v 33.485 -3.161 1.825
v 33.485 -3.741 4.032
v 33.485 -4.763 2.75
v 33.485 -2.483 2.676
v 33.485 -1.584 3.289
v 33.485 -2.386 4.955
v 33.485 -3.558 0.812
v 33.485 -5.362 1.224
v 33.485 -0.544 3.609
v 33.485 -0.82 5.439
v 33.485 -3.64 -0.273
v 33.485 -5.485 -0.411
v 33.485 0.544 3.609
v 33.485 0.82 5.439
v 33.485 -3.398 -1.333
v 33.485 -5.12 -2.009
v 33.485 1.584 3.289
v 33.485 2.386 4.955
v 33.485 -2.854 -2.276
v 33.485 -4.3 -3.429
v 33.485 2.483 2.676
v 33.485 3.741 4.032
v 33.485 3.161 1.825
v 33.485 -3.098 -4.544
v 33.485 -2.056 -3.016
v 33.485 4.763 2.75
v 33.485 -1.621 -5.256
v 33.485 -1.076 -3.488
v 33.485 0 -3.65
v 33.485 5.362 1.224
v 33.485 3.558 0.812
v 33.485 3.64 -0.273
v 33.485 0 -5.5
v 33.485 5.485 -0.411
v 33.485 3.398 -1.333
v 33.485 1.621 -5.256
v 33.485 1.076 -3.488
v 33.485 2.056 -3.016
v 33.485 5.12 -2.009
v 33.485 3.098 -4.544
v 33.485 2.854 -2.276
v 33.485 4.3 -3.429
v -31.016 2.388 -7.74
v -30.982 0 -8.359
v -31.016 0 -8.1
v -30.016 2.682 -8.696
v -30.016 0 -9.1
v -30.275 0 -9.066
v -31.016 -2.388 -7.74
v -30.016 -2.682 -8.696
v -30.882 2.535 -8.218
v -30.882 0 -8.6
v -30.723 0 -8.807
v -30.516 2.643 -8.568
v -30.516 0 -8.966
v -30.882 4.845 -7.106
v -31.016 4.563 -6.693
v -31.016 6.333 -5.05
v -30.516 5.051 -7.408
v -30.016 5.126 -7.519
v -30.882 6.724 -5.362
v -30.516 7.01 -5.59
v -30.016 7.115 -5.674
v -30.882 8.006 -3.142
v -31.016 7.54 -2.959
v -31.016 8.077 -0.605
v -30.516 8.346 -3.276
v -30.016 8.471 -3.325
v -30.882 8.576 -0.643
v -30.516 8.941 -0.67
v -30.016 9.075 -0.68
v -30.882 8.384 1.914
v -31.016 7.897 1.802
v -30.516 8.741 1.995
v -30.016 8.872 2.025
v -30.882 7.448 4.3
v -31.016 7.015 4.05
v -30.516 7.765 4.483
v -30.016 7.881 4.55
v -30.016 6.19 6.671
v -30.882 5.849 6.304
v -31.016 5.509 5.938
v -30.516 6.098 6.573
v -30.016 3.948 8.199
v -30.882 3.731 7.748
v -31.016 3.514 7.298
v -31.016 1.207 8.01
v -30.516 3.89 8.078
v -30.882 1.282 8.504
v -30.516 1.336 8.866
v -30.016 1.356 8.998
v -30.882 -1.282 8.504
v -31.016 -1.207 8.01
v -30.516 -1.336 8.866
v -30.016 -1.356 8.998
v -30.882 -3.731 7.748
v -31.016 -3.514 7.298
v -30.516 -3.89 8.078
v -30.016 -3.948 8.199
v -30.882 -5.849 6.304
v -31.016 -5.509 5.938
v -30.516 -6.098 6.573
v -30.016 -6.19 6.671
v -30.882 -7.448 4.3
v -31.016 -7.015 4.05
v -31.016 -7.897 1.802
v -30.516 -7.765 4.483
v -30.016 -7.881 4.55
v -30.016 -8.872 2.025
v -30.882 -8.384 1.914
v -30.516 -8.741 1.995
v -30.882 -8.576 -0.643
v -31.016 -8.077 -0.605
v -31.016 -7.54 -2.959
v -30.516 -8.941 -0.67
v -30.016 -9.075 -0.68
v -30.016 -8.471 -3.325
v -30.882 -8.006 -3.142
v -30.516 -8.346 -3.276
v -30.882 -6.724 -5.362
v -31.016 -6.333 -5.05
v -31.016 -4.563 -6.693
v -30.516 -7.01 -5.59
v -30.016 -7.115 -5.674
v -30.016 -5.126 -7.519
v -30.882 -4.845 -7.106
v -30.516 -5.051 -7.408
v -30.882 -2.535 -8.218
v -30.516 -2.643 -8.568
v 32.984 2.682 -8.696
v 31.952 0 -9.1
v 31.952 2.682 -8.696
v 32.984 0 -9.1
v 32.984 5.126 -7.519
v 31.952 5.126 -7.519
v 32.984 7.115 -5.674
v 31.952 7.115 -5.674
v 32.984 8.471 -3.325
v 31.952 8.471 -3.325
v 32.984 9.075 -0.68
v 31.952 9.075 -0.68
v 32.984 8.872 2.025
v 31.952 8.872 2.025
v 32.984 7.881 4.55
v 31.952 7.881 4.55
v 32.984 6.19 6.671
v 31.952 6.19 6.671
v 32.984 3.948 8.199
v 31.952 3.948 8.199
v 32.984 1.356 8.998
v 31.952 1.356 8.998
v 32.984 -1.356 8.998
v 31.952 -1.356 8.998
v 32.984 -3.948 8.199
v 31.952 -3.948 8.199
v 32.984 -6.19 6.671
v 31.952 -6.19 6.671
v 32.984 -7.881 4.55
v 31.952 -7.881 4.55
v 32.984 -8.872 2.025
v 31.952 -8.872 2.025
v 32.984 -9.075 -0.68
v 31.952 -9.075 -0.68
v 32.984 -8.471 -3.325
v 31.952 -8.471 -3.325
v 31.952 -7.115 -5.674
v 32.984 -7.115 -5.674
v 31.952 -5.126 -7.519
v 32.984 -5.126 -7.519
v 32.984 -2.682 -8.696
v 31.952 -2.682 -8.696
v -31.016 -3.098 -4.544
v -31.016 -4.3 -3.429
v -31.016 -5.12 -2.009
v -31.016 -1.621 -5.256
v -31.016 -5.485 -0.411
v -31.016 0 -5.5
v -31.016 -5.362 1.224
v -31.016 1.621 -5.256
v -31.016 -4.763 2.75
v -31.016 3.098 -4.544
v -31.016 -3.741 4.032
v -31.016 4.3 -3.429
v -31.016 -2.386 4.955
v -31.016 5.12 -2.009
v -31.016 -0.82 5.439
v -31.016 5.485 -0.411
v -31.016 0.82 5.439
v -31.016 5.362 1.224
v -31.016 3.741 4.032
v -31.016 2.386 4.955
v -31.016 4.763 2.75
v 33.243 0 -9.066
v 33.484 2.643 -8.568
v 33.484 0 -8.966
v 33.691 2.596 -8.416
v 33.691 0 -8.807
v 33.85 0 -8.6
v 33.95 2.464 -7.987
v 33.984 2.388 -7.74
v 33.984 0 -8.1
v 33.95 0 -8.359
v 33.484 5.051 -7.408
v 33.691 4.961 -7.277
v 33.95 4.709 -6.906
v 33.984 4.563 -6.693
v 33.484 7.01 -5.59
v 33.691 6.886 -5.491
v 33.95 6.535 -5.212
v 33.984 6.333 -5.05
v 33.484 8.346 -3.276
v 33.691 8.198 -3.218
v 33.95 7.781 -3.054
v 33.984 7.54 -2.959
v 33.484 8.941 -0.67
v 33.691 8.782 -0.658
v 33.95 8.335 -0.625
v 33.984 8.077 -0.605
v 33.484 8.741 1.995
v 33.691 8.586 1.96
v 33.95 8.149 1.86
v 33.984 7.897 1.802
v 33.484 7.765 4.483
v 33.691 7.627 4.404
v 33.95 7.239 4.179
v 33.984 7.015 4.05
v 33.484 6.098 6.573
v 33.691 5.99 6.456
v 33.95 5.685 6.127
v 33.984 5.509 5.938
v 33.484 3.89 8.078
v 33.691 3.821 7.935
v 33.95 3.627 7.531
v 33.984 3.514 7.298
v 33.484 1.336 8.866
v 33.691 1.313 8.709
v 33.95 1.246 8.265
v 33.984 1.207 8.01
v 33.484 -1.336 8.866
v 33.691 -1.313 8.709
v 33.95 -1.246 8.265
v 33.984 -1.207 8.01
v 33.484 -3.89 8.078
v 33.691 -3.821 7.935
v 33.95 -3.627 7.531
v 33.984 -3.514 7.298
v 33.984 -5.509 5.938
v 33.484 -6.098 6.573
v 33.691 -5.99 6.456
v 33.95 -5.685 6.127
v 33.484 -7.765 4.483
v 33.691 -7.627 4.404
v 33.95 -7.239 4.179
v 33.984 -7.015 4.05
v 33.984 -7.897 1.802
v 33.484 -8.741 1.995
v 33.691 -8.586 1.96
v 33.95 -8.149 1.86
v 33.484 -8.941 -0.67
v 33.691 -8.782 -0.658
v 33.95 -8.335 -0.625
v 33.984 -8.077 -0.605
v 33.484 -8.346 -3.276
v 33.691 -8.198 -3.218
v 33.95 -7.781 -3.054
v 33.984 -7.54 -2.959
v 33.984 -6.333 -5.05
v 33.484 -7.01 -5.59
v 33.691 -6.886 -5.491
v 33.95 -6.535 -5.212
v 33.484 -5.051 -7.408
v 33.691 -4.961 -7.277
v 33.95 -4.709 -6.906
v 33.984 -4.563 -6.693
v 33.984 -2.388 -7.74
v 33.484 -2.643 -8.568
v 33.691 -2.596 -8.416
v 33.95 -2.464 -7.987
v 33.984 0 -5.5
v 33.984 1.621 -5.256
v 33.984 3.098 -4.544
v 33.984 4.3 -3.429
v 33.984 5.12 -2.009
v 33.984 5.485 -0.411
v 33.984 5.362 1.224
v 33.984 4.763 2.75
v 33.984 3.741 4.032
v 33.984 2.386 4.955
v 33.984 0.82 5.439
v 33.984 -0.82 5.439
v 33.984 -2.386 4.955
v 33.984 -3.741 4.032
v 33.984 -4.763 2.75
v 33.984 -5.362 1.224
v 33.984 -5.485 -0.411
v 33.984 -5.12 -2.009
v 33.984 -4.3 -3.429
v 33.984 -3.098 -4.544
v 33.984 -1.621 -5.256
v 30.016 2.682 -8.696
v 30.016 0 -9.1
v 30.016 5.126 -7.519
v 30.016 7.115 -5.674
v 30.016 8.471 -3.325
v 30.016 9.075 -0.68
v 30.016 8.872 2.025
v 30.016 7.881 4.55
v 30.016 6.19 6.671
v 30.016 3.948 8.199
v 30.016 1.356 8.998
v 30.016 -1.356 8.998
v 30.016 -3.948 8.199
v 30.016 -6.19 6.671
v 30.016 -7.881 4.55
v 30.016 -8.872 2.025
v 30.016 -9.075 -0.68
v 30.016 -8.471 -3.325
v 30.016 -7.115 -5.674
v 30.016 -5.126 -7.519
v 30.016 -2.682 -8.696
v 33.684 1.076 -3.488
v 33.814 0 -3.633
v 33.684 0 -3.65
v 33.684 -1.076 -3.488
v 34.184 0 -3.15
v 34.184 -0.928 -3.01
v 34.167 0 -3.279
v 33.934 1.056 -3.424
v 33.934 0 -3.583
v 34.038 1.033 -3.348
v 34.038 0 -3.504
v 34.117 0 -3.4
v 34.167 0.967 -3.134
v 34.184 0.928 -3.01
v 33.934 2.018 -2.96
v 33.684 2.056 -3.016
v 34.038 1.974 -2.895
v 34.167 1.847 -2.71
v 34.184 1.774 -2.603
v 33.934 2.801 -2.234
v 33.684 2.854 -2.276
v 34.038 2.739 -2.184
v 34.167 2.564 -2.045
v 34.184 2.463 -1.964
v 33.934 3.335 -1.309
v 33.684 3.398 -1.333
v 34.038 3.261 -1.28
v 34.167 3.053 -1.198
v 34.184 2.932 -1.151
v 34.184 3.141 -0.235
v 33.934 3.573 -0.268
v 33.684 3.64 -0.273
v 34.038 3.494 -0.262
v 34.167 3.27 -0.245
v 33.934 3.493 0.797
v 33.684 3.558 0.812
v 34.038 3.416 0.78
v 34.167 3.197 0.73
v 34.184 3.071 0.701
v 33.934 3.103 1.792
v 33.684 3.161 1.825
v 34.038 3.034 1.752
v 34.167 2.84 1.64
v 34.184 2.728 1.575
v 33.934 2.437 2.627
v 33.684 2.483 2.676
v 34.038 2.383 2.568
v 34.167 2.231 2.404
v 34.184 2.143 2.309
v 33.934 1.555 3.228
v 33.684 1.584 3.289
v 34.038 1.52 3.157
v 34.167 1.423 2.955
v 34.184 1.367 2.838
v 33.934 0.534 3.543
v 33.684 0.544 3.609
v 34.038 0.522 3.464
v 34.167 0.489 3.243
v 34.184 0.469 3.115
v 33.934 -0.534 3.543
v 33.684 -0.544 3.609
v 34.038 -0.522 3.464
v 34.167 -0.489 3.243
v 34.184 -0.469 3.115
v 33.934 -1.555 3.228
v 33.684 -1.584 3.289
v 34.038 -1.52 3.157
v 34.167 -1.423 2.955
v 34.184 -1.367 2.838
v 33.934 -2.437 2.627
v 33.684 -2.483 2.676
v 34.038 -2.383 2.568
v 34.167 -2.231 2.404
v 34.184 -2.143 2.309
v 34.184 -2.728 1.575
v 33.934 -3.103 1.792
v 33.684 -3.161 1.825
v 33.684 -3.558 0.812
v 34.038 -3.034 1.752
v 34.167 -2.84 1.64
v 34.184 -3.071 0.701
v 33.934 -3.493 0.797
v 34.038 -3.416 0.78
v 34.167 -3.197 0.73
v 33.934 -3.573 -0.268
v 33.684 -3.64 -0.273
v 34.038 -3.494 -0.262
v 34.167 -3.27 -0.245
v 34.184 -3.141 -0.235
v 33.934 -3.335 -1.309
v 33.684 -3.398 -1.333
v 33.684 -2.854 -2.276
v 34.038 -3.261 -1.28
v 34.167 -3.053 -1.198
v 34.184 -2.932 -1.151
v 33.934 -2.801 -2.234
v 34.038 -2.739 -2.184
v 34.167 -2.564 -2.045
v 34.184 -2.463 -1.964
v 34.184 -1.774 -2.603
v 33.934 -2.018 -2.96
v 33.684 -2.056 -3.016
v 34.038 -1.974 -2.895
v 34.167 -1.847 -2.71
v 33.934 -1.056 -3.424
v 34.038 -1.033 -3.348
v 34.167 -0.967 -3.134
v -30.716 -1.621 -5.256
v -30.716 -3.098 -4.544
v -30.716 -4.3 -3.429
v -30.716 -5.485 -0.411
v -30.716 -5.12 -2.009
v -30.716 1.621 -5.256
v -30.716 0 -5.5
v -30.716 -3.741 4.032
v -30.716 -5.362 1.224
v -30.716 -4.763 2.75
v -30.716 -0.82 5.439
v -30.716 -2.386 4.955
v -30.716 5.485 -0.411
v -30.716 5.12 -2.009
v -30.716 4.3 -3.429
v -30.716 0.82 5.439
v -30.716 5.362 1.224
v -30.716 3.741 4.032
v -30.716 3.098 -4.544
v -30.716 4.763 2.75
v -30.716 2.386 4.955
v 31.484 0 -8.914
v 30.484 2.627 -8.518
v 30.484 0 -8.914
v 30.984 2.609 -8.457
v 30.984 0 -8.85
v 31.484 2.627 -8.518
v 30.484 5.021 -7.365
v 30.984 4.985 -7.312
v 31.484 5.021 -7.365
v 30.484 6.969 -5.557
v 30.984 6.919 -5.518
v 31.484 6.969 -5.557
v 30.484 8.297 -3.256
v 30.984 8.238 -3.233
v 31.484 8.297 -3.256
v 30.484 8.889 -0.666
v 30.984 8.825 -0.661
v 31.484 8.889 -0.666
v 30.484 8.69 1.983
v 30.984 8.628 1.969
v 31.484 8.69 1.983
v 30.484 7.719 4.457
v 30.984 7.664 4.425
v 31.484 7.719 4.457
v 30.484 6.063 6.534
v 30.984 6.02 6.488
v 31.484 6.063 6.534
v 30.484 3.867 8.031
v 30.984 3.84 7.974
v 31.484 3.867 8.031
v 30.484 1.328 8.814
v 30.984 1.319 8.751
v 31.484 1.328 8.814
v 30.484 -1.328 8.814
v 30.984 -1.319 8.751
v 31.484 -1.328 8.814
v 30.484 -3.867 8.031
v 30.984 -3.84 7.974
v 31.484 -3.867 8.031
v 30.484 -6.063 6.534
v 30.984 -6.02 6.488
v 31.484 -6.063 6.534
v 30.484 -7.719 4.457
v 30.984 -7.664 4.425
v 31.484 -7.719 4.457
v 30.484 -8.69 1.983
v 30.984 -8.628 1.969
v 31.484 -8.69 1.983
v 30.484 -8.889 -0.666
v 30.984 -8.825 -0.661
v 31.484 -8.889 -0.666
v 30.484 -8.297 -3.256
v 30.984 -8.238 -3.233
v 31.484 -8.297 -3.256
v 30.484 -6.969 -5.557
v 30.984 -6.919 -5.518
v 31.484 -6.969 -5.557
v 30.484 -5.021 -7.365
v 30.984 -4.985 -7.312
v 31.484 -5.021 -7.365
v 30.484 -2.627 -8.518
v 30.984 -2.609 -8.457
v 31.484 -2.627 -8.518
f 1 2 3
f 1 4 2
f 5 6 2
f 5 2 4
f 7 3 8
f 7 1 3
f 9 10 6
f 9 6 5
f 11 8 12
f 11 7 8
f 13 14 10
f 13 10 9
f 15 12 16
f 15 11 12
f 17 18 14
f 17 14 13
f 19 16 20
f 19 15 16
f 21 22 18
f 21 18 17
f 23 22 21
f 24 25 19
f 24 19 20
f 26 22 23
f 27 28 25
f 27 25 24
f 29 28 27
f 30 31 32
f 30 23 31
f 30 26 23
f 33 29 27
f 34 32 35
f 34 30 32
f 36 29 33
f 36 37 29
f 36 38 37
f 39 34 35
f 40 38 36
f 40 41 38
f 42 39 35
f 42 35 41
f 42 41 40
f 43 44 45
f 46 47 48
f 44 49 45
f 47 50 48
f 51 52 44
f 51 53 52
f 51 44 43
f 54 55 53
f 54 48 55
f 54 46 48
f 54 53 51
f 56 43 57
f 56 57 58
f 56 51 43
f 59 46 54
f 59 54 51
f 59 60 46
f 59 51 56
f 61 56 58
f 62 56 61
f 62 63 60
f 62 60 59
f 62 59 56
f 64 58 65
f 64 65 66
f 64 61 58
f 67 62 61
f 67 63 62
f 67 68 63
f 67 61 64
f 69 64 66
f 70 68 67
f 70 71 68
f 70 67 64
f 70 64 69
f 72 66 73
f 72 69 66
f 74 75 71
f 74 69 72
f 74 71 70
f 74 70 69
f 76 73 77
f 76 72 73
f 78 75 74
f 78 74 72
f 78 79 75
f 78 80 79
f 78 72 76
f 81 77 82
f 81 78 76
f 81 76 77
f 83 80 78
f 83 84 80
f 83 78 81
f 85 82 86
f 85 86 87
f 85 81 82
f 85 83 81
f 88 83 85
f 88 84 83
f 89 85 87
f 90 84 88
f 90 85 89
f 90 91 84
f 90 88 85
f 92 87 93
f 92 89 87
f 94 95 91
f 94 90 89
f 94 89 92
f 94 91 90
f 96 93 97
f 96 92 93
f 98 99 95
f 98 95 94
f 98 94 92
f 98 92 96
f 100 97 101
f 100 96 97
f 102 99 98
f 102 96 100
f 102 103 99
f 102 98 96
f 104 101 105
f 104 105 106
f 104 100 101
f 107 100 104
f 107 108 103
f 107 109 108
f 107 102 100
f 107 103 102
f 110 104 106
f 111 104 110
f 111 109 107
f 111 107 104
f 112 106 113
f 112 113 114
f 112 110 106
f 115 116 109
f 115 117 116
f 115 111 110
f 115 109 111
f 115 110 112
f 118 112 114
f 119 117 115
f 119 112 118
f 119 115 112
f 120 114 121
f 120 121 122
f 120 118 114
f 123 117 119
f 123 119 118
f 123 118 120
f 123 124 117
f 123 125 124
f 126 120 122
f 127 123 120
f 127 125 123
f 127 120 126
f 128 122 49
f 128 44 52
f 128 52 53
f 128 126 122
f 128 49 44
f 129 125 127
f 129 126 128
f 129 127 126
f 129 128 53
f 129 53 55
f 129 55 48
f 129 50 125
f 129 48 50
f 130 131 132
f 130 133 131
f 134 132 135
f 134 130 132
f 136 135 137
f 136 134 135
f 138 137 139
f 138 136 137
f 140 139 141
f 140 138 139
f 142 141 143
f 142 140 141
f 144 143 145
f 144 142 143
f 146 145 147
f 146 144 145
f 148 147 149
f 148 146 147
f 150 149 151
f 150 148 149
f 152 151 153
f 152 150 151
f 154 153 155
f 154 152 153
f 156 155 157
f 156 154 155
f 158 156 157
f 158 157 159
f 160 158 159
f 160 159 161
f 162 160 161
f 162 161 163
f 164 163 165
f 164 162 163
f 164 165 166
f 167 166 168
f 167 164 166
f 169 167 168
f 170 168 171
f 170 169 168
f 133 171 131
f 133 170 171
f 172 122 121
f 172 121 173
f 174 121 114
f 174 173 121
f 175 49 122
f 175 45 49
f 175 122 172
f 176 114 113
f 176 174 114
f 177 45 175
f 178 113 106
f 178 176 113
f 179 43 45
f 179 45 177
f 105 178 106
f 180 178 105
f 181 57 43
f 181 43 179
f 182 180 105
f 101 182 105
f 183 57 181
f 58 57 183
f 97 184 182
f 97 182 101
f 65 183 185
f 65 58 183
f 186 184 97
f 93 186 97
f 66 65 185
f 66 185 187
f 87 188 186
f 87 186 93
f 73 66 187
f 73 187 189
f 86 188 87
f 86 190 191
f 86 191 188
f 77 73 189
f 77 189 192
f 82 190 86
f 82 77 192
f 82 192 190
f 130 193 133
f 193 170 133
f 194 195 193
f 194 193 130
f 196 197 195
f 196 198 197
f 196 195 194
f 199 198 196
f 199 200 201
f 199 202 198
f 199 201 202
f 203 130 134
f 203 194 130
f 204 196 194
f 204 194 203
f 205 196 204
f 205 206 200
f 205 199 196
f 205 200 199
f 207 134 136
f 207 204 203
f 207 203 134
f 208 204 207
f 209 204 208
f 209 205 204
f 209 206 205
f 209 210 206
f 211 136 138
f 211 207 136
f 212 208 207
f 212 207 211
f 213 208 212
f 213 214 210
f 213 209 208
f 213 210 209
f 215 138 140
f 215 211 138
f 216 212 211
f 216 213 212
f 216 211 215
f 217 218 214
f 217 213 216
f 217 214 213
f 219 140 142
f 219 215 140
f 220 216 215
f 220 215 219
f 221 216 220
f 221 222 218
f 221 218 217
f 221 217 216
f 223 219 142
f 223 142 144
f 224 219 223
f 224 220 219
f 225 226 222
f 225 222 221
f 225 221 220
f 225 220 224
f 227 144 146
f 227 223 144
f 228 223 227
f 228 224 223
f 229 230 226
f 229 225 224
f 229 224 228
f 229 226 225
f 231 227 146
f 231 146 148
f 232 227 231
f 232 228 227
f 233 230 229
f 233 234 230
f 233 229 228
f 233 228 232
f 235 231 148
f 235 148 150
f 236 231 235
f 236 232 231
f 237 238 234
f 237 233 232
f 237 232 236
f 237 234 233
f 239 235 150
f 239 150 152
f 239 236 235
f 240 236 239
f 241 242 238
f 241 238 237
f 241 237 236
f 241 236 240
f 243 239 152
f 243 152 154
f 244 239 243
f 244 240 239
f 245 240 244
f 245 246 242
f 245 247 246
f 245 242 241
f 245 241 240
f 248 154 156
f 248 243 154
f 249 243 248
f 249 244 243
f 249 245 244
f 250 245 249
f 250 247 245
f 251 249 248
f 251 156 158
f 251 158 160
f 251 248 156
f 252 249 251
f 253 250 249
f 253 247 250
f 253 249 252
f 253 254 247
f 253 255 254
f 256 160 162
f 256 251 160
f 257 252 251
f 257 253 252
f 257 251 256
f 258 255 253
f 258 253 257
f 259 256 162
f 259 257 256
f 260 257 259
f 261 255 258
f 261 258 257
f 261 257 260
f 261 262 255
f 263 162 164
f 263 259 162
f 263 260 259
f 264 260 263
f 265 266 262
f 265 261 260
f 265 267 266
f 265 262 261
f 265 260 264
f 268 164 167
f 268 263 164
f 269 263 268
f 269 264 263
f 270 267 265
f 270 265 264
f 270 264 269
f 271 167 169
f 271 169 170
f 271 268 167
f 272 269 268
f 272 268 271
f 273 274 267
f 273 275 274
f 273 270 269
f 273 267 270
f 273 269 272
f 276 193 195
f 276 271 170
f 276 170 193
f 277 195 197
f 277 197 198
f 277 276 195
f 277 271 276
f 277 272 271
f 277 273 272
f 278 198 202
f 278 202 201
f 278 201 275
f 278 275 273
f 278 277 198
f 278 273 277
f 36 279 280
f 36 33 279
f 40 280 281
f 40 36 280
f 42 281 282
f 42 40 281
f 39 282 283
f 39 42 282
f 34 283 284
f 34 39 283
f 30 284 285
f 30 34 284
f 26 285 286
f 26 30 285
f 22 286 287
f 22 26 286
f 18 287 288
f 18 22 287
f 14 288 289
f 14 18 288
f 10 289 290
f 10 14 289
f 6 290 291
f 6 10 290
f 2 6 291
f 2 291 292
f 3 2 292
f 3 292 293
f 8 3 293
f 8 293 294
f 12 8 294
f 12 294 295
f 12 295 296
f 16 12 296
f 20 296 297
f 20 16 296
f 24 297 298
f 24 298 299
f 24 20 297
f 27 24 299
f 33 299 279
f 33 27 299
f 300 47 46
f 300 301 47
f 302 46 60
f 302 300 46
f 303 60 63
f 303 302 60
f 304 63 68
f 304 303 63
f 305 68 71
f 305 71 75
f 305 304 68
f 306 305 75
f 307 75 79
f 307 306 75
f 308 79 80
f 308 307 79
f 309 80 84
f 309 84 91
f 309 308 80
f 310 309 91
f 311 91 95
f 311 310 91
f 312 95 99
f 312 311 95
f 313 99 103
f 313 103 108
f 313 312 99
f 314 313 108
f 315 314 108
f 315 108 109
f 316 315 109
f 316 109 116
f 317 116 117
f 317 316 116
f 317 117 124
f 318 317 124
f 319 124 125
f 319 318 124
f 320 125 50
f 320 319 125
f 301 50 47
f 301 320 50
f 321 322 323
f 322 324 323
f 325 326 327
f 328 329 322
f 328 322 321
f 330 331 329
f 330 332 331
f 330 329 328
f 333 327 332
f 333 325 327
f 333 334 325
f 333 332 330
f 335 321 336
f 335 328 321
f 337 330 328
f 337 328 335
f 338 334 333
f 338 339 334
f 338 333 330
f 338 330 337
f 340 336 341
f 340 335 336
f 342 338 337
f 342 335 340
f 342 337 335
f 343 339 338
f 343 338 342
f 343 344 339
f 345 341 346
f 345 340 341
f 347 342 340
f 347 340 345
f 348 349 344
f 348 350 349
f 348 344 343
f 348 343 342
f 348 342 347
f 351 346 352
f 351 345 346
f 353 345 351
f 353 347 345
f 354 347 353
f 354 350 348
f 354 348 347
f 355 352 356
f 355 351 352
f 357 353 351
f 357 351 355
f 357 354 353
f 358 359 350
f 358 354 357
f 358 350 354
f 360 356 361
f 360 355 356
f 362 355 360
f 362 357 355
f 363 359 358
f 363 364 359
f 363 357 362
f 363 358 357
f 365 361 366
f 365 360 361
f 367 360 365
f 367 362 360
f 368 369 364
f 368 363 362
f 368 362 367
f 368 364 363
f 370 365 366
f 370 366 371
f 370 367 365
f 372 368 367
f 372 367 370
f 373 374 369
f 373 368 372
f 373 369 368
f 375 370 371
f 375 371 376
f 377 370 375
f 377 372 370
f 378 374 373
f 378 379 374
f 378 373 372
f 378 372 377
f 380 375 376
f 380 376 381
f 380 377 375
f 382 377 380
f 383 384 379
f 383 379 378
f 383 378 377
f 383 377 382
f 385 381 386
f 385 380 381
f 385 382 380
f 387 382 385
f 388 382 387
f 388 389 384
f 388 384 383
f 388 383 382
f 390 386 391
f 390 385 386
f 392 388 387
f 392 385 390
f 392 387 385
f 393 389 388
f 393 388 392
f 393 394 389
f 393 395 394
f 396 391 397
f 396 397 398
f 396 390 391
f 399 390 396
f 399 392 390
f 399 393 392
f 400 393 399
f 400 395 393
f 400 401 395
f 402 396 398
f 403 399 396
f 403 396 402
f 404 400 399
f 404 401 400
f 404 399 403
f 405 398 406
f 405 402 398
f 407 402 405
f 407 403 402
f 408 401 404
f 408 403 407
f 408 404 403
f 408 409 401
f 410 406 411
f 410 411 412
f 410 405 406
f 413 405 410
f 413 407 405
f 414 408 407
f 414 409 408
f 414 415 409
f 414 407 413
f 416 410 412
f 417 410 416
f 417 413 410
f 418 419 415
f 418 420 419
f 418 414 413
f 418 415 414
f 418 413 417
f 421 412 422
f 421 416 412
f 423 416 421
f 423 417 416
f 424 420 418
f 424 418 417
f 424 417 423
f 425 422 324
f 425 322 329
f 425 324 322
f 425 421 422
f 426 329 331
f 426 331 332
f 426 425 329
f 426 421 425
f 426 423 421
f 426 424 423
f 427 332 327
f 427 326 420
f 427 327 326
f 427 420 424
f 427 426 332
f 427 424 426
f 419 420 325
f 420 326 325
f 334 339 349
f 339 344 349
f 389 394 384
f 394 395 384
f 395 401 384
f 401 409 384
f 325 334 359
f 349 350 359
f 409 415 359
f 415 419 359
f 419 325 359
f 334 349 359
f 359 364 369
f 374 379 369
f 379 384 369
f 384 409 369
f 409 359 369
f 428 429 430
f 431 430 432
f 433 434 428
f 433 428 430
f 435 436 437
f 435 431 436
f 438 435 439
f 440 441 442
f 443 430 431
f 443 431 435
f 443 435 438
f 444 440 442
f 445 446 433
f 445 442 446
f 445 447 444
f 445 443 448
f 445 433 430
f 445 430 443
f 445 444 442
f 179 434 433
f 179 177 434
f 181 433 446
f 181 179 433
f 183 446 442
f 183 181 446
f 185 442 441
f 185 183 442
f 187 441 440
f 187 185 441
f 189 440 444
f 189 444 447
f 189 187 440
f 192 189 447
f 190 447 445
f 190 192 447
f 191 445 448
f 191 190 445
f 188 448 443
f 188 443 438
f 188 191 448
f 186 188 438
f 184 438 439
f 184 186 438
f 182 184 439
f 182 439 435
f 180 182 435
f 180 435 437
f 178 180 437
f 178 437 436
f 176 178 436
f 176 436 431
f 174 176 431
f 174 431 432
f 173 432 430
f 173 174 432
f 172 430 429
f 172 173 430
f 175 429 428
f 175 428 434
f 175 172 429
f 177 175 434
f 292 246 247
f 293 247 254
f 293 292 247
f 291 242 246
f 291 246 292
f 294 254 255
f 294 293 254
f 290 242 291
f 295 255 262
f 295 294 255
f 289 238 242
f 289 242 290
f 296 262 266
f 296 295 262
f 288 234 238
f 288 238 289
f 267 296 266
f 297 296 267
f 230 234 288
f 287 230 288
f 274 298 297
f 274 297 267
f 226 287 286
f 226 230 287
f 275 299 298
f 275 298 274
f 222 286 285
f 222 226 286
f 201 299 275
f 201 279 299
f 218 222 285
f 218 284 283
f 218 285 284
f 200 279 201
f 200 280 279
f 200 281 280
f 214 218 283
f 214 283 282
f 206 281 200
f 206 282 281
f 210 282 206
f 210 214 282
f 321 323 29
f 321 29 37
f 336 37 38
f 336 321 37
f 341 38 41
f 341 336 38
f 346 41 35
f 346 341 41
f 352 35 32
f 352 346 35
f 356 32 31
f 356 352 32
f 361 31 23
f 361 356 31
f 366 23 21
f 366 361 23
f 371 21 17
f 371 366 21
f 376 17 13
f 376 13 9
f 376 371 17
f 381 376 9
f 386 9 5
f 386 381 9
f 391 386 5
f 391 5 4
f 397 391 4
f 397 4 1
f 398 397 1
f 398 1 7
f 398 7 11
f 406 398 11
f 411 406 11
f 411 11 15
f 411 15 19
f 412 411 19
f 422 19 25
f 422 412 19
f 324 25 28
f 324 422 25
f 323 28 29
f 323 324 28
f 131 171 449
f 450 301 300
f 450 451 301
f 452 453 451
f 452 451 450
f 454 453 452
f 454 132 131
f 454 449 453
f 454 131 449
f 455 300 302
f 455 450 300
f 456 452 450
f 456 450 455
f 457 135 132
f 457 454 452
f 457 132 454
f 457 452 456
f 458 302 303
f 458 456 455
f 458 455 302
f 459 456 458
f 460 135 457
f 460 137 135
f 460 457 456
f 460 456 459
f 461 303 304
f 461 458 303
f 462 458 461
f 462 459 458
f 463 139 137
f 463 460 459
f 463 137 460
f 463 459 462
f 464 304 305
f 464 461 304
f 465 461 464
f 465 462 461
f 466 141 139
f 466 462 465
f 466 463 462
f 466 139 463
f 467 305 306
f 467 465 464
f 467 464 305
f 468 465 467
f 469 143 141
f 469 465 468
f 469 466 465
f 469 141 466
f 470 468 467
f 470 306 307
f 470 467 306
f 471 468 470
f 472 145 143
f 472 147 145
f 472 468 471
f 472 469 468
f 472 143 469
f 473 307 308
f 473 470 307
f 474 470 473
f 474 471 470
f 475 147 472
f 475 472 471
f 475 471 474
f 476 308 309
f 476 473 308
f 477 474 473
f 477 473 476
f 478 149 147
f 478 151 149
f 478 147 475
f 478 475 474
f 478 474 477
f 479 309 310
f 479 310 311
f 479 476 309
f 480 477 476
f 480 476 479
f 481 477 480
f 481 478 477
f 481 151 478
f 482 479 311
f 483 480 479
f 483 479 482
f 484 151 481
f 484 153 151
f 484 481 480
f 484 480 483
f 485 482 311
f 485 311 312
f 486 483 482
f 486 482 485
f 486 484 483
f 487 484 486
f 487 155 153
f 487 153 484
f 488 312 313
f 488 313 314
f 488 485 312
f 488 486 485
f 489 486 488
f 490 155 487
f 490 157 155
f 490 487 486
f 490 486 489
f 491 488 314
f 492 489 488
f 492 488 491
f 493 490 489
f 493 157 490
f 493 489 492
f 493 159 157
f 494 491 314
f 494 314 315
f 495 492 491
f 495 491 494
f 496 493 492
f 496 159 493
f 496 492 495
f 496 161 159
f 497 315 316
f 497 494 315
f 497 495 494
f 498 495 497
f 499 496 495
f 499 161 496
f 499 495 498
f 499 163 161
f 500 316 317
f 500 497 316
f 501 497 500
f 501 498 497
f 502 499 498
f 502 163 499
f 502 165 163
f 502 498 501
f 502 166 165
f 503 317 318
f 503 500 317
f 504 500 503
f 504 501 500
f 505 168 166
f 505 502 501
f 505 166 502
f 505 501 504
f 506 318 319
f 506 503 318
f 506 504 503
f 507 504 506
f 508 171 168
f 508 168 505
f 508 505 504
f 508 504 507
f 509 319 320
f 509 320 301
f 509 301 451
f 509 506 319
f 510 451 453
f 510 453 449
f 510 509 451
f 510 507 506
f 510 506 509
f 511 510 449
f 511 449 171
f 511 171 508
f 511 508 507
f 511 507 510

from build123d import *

# Parameters (mm, degrees)
SKETCH2_W = 0.699473795
SKETCH2_H = 3.65
FILLET1_R = 0.5


with BuildPart() as part:
    # Sketch1 → mainBody (revolve)
    with BuildSketch(Plane(origin=(0, 0, 0), x_dir=(1, 0, 0), z_dir=(0, 1, 0))):
        with BuildLine():
            Line((-30.015877082, 9.1), (30.015877082, 9.1))
            ThreePointArc((30.015877082, 9.1), (30.984122918, 8.85), (31.952368755, 9.1))
            Line((31.952368755, 9.1), (32.984122918, 9.1))
            ThreePointArc((32.984122918, 9.1), (33.691229699, 8.807106781), (33.984122918, 8.1))
            Line((33.984122918, 8.1), (33.984122918, 5.5))
            Line((33.984122918, 5.5), (33.484649123, 5.5))
            Line((33.484649123, 5.5), (33.484649123, 0))
            Line((33.484649123, 0), (-30.715877082, 0))
            Line((-30.715877082, 0), (-30.715877082, 5.5))
            Line((-30.715877082, 5.5), (-31.015877082, 5.5))
            Line((-31.015877082, 5.5), (-31.015877082, 8.1))
            ThreePointArc((-31.015877082, 8.1), (-30.722983863, 8.807106781), (-30.015877082, 9.1))
        make_face()
    revolve(axis=Axis((0, 0, 0), (1, 0, 0)))

    # Sketch2 → Revolve2 (revolve)
    with BuildSketch(Plane(origin=(0, 0, 0), x_dir=(1, 0, 0), z_dir=(0, 1, 0))):
        with Locations((33.834386021, 1.825)):
            Rectangle(SKETCH2_W, SKETCH2_H)
    revolve(axis=Axis((33.484649123, 0, 0), (1, 0, 0)))

    # Fillet1
    fillet1_edges = [part.edges().sort_by_distance(p)[0] for p in [
        (34.184122918, 0, 3.65),
    ]]
    fillet(fillet1_edges, radius=FILLET1_R)


solid = part.part
